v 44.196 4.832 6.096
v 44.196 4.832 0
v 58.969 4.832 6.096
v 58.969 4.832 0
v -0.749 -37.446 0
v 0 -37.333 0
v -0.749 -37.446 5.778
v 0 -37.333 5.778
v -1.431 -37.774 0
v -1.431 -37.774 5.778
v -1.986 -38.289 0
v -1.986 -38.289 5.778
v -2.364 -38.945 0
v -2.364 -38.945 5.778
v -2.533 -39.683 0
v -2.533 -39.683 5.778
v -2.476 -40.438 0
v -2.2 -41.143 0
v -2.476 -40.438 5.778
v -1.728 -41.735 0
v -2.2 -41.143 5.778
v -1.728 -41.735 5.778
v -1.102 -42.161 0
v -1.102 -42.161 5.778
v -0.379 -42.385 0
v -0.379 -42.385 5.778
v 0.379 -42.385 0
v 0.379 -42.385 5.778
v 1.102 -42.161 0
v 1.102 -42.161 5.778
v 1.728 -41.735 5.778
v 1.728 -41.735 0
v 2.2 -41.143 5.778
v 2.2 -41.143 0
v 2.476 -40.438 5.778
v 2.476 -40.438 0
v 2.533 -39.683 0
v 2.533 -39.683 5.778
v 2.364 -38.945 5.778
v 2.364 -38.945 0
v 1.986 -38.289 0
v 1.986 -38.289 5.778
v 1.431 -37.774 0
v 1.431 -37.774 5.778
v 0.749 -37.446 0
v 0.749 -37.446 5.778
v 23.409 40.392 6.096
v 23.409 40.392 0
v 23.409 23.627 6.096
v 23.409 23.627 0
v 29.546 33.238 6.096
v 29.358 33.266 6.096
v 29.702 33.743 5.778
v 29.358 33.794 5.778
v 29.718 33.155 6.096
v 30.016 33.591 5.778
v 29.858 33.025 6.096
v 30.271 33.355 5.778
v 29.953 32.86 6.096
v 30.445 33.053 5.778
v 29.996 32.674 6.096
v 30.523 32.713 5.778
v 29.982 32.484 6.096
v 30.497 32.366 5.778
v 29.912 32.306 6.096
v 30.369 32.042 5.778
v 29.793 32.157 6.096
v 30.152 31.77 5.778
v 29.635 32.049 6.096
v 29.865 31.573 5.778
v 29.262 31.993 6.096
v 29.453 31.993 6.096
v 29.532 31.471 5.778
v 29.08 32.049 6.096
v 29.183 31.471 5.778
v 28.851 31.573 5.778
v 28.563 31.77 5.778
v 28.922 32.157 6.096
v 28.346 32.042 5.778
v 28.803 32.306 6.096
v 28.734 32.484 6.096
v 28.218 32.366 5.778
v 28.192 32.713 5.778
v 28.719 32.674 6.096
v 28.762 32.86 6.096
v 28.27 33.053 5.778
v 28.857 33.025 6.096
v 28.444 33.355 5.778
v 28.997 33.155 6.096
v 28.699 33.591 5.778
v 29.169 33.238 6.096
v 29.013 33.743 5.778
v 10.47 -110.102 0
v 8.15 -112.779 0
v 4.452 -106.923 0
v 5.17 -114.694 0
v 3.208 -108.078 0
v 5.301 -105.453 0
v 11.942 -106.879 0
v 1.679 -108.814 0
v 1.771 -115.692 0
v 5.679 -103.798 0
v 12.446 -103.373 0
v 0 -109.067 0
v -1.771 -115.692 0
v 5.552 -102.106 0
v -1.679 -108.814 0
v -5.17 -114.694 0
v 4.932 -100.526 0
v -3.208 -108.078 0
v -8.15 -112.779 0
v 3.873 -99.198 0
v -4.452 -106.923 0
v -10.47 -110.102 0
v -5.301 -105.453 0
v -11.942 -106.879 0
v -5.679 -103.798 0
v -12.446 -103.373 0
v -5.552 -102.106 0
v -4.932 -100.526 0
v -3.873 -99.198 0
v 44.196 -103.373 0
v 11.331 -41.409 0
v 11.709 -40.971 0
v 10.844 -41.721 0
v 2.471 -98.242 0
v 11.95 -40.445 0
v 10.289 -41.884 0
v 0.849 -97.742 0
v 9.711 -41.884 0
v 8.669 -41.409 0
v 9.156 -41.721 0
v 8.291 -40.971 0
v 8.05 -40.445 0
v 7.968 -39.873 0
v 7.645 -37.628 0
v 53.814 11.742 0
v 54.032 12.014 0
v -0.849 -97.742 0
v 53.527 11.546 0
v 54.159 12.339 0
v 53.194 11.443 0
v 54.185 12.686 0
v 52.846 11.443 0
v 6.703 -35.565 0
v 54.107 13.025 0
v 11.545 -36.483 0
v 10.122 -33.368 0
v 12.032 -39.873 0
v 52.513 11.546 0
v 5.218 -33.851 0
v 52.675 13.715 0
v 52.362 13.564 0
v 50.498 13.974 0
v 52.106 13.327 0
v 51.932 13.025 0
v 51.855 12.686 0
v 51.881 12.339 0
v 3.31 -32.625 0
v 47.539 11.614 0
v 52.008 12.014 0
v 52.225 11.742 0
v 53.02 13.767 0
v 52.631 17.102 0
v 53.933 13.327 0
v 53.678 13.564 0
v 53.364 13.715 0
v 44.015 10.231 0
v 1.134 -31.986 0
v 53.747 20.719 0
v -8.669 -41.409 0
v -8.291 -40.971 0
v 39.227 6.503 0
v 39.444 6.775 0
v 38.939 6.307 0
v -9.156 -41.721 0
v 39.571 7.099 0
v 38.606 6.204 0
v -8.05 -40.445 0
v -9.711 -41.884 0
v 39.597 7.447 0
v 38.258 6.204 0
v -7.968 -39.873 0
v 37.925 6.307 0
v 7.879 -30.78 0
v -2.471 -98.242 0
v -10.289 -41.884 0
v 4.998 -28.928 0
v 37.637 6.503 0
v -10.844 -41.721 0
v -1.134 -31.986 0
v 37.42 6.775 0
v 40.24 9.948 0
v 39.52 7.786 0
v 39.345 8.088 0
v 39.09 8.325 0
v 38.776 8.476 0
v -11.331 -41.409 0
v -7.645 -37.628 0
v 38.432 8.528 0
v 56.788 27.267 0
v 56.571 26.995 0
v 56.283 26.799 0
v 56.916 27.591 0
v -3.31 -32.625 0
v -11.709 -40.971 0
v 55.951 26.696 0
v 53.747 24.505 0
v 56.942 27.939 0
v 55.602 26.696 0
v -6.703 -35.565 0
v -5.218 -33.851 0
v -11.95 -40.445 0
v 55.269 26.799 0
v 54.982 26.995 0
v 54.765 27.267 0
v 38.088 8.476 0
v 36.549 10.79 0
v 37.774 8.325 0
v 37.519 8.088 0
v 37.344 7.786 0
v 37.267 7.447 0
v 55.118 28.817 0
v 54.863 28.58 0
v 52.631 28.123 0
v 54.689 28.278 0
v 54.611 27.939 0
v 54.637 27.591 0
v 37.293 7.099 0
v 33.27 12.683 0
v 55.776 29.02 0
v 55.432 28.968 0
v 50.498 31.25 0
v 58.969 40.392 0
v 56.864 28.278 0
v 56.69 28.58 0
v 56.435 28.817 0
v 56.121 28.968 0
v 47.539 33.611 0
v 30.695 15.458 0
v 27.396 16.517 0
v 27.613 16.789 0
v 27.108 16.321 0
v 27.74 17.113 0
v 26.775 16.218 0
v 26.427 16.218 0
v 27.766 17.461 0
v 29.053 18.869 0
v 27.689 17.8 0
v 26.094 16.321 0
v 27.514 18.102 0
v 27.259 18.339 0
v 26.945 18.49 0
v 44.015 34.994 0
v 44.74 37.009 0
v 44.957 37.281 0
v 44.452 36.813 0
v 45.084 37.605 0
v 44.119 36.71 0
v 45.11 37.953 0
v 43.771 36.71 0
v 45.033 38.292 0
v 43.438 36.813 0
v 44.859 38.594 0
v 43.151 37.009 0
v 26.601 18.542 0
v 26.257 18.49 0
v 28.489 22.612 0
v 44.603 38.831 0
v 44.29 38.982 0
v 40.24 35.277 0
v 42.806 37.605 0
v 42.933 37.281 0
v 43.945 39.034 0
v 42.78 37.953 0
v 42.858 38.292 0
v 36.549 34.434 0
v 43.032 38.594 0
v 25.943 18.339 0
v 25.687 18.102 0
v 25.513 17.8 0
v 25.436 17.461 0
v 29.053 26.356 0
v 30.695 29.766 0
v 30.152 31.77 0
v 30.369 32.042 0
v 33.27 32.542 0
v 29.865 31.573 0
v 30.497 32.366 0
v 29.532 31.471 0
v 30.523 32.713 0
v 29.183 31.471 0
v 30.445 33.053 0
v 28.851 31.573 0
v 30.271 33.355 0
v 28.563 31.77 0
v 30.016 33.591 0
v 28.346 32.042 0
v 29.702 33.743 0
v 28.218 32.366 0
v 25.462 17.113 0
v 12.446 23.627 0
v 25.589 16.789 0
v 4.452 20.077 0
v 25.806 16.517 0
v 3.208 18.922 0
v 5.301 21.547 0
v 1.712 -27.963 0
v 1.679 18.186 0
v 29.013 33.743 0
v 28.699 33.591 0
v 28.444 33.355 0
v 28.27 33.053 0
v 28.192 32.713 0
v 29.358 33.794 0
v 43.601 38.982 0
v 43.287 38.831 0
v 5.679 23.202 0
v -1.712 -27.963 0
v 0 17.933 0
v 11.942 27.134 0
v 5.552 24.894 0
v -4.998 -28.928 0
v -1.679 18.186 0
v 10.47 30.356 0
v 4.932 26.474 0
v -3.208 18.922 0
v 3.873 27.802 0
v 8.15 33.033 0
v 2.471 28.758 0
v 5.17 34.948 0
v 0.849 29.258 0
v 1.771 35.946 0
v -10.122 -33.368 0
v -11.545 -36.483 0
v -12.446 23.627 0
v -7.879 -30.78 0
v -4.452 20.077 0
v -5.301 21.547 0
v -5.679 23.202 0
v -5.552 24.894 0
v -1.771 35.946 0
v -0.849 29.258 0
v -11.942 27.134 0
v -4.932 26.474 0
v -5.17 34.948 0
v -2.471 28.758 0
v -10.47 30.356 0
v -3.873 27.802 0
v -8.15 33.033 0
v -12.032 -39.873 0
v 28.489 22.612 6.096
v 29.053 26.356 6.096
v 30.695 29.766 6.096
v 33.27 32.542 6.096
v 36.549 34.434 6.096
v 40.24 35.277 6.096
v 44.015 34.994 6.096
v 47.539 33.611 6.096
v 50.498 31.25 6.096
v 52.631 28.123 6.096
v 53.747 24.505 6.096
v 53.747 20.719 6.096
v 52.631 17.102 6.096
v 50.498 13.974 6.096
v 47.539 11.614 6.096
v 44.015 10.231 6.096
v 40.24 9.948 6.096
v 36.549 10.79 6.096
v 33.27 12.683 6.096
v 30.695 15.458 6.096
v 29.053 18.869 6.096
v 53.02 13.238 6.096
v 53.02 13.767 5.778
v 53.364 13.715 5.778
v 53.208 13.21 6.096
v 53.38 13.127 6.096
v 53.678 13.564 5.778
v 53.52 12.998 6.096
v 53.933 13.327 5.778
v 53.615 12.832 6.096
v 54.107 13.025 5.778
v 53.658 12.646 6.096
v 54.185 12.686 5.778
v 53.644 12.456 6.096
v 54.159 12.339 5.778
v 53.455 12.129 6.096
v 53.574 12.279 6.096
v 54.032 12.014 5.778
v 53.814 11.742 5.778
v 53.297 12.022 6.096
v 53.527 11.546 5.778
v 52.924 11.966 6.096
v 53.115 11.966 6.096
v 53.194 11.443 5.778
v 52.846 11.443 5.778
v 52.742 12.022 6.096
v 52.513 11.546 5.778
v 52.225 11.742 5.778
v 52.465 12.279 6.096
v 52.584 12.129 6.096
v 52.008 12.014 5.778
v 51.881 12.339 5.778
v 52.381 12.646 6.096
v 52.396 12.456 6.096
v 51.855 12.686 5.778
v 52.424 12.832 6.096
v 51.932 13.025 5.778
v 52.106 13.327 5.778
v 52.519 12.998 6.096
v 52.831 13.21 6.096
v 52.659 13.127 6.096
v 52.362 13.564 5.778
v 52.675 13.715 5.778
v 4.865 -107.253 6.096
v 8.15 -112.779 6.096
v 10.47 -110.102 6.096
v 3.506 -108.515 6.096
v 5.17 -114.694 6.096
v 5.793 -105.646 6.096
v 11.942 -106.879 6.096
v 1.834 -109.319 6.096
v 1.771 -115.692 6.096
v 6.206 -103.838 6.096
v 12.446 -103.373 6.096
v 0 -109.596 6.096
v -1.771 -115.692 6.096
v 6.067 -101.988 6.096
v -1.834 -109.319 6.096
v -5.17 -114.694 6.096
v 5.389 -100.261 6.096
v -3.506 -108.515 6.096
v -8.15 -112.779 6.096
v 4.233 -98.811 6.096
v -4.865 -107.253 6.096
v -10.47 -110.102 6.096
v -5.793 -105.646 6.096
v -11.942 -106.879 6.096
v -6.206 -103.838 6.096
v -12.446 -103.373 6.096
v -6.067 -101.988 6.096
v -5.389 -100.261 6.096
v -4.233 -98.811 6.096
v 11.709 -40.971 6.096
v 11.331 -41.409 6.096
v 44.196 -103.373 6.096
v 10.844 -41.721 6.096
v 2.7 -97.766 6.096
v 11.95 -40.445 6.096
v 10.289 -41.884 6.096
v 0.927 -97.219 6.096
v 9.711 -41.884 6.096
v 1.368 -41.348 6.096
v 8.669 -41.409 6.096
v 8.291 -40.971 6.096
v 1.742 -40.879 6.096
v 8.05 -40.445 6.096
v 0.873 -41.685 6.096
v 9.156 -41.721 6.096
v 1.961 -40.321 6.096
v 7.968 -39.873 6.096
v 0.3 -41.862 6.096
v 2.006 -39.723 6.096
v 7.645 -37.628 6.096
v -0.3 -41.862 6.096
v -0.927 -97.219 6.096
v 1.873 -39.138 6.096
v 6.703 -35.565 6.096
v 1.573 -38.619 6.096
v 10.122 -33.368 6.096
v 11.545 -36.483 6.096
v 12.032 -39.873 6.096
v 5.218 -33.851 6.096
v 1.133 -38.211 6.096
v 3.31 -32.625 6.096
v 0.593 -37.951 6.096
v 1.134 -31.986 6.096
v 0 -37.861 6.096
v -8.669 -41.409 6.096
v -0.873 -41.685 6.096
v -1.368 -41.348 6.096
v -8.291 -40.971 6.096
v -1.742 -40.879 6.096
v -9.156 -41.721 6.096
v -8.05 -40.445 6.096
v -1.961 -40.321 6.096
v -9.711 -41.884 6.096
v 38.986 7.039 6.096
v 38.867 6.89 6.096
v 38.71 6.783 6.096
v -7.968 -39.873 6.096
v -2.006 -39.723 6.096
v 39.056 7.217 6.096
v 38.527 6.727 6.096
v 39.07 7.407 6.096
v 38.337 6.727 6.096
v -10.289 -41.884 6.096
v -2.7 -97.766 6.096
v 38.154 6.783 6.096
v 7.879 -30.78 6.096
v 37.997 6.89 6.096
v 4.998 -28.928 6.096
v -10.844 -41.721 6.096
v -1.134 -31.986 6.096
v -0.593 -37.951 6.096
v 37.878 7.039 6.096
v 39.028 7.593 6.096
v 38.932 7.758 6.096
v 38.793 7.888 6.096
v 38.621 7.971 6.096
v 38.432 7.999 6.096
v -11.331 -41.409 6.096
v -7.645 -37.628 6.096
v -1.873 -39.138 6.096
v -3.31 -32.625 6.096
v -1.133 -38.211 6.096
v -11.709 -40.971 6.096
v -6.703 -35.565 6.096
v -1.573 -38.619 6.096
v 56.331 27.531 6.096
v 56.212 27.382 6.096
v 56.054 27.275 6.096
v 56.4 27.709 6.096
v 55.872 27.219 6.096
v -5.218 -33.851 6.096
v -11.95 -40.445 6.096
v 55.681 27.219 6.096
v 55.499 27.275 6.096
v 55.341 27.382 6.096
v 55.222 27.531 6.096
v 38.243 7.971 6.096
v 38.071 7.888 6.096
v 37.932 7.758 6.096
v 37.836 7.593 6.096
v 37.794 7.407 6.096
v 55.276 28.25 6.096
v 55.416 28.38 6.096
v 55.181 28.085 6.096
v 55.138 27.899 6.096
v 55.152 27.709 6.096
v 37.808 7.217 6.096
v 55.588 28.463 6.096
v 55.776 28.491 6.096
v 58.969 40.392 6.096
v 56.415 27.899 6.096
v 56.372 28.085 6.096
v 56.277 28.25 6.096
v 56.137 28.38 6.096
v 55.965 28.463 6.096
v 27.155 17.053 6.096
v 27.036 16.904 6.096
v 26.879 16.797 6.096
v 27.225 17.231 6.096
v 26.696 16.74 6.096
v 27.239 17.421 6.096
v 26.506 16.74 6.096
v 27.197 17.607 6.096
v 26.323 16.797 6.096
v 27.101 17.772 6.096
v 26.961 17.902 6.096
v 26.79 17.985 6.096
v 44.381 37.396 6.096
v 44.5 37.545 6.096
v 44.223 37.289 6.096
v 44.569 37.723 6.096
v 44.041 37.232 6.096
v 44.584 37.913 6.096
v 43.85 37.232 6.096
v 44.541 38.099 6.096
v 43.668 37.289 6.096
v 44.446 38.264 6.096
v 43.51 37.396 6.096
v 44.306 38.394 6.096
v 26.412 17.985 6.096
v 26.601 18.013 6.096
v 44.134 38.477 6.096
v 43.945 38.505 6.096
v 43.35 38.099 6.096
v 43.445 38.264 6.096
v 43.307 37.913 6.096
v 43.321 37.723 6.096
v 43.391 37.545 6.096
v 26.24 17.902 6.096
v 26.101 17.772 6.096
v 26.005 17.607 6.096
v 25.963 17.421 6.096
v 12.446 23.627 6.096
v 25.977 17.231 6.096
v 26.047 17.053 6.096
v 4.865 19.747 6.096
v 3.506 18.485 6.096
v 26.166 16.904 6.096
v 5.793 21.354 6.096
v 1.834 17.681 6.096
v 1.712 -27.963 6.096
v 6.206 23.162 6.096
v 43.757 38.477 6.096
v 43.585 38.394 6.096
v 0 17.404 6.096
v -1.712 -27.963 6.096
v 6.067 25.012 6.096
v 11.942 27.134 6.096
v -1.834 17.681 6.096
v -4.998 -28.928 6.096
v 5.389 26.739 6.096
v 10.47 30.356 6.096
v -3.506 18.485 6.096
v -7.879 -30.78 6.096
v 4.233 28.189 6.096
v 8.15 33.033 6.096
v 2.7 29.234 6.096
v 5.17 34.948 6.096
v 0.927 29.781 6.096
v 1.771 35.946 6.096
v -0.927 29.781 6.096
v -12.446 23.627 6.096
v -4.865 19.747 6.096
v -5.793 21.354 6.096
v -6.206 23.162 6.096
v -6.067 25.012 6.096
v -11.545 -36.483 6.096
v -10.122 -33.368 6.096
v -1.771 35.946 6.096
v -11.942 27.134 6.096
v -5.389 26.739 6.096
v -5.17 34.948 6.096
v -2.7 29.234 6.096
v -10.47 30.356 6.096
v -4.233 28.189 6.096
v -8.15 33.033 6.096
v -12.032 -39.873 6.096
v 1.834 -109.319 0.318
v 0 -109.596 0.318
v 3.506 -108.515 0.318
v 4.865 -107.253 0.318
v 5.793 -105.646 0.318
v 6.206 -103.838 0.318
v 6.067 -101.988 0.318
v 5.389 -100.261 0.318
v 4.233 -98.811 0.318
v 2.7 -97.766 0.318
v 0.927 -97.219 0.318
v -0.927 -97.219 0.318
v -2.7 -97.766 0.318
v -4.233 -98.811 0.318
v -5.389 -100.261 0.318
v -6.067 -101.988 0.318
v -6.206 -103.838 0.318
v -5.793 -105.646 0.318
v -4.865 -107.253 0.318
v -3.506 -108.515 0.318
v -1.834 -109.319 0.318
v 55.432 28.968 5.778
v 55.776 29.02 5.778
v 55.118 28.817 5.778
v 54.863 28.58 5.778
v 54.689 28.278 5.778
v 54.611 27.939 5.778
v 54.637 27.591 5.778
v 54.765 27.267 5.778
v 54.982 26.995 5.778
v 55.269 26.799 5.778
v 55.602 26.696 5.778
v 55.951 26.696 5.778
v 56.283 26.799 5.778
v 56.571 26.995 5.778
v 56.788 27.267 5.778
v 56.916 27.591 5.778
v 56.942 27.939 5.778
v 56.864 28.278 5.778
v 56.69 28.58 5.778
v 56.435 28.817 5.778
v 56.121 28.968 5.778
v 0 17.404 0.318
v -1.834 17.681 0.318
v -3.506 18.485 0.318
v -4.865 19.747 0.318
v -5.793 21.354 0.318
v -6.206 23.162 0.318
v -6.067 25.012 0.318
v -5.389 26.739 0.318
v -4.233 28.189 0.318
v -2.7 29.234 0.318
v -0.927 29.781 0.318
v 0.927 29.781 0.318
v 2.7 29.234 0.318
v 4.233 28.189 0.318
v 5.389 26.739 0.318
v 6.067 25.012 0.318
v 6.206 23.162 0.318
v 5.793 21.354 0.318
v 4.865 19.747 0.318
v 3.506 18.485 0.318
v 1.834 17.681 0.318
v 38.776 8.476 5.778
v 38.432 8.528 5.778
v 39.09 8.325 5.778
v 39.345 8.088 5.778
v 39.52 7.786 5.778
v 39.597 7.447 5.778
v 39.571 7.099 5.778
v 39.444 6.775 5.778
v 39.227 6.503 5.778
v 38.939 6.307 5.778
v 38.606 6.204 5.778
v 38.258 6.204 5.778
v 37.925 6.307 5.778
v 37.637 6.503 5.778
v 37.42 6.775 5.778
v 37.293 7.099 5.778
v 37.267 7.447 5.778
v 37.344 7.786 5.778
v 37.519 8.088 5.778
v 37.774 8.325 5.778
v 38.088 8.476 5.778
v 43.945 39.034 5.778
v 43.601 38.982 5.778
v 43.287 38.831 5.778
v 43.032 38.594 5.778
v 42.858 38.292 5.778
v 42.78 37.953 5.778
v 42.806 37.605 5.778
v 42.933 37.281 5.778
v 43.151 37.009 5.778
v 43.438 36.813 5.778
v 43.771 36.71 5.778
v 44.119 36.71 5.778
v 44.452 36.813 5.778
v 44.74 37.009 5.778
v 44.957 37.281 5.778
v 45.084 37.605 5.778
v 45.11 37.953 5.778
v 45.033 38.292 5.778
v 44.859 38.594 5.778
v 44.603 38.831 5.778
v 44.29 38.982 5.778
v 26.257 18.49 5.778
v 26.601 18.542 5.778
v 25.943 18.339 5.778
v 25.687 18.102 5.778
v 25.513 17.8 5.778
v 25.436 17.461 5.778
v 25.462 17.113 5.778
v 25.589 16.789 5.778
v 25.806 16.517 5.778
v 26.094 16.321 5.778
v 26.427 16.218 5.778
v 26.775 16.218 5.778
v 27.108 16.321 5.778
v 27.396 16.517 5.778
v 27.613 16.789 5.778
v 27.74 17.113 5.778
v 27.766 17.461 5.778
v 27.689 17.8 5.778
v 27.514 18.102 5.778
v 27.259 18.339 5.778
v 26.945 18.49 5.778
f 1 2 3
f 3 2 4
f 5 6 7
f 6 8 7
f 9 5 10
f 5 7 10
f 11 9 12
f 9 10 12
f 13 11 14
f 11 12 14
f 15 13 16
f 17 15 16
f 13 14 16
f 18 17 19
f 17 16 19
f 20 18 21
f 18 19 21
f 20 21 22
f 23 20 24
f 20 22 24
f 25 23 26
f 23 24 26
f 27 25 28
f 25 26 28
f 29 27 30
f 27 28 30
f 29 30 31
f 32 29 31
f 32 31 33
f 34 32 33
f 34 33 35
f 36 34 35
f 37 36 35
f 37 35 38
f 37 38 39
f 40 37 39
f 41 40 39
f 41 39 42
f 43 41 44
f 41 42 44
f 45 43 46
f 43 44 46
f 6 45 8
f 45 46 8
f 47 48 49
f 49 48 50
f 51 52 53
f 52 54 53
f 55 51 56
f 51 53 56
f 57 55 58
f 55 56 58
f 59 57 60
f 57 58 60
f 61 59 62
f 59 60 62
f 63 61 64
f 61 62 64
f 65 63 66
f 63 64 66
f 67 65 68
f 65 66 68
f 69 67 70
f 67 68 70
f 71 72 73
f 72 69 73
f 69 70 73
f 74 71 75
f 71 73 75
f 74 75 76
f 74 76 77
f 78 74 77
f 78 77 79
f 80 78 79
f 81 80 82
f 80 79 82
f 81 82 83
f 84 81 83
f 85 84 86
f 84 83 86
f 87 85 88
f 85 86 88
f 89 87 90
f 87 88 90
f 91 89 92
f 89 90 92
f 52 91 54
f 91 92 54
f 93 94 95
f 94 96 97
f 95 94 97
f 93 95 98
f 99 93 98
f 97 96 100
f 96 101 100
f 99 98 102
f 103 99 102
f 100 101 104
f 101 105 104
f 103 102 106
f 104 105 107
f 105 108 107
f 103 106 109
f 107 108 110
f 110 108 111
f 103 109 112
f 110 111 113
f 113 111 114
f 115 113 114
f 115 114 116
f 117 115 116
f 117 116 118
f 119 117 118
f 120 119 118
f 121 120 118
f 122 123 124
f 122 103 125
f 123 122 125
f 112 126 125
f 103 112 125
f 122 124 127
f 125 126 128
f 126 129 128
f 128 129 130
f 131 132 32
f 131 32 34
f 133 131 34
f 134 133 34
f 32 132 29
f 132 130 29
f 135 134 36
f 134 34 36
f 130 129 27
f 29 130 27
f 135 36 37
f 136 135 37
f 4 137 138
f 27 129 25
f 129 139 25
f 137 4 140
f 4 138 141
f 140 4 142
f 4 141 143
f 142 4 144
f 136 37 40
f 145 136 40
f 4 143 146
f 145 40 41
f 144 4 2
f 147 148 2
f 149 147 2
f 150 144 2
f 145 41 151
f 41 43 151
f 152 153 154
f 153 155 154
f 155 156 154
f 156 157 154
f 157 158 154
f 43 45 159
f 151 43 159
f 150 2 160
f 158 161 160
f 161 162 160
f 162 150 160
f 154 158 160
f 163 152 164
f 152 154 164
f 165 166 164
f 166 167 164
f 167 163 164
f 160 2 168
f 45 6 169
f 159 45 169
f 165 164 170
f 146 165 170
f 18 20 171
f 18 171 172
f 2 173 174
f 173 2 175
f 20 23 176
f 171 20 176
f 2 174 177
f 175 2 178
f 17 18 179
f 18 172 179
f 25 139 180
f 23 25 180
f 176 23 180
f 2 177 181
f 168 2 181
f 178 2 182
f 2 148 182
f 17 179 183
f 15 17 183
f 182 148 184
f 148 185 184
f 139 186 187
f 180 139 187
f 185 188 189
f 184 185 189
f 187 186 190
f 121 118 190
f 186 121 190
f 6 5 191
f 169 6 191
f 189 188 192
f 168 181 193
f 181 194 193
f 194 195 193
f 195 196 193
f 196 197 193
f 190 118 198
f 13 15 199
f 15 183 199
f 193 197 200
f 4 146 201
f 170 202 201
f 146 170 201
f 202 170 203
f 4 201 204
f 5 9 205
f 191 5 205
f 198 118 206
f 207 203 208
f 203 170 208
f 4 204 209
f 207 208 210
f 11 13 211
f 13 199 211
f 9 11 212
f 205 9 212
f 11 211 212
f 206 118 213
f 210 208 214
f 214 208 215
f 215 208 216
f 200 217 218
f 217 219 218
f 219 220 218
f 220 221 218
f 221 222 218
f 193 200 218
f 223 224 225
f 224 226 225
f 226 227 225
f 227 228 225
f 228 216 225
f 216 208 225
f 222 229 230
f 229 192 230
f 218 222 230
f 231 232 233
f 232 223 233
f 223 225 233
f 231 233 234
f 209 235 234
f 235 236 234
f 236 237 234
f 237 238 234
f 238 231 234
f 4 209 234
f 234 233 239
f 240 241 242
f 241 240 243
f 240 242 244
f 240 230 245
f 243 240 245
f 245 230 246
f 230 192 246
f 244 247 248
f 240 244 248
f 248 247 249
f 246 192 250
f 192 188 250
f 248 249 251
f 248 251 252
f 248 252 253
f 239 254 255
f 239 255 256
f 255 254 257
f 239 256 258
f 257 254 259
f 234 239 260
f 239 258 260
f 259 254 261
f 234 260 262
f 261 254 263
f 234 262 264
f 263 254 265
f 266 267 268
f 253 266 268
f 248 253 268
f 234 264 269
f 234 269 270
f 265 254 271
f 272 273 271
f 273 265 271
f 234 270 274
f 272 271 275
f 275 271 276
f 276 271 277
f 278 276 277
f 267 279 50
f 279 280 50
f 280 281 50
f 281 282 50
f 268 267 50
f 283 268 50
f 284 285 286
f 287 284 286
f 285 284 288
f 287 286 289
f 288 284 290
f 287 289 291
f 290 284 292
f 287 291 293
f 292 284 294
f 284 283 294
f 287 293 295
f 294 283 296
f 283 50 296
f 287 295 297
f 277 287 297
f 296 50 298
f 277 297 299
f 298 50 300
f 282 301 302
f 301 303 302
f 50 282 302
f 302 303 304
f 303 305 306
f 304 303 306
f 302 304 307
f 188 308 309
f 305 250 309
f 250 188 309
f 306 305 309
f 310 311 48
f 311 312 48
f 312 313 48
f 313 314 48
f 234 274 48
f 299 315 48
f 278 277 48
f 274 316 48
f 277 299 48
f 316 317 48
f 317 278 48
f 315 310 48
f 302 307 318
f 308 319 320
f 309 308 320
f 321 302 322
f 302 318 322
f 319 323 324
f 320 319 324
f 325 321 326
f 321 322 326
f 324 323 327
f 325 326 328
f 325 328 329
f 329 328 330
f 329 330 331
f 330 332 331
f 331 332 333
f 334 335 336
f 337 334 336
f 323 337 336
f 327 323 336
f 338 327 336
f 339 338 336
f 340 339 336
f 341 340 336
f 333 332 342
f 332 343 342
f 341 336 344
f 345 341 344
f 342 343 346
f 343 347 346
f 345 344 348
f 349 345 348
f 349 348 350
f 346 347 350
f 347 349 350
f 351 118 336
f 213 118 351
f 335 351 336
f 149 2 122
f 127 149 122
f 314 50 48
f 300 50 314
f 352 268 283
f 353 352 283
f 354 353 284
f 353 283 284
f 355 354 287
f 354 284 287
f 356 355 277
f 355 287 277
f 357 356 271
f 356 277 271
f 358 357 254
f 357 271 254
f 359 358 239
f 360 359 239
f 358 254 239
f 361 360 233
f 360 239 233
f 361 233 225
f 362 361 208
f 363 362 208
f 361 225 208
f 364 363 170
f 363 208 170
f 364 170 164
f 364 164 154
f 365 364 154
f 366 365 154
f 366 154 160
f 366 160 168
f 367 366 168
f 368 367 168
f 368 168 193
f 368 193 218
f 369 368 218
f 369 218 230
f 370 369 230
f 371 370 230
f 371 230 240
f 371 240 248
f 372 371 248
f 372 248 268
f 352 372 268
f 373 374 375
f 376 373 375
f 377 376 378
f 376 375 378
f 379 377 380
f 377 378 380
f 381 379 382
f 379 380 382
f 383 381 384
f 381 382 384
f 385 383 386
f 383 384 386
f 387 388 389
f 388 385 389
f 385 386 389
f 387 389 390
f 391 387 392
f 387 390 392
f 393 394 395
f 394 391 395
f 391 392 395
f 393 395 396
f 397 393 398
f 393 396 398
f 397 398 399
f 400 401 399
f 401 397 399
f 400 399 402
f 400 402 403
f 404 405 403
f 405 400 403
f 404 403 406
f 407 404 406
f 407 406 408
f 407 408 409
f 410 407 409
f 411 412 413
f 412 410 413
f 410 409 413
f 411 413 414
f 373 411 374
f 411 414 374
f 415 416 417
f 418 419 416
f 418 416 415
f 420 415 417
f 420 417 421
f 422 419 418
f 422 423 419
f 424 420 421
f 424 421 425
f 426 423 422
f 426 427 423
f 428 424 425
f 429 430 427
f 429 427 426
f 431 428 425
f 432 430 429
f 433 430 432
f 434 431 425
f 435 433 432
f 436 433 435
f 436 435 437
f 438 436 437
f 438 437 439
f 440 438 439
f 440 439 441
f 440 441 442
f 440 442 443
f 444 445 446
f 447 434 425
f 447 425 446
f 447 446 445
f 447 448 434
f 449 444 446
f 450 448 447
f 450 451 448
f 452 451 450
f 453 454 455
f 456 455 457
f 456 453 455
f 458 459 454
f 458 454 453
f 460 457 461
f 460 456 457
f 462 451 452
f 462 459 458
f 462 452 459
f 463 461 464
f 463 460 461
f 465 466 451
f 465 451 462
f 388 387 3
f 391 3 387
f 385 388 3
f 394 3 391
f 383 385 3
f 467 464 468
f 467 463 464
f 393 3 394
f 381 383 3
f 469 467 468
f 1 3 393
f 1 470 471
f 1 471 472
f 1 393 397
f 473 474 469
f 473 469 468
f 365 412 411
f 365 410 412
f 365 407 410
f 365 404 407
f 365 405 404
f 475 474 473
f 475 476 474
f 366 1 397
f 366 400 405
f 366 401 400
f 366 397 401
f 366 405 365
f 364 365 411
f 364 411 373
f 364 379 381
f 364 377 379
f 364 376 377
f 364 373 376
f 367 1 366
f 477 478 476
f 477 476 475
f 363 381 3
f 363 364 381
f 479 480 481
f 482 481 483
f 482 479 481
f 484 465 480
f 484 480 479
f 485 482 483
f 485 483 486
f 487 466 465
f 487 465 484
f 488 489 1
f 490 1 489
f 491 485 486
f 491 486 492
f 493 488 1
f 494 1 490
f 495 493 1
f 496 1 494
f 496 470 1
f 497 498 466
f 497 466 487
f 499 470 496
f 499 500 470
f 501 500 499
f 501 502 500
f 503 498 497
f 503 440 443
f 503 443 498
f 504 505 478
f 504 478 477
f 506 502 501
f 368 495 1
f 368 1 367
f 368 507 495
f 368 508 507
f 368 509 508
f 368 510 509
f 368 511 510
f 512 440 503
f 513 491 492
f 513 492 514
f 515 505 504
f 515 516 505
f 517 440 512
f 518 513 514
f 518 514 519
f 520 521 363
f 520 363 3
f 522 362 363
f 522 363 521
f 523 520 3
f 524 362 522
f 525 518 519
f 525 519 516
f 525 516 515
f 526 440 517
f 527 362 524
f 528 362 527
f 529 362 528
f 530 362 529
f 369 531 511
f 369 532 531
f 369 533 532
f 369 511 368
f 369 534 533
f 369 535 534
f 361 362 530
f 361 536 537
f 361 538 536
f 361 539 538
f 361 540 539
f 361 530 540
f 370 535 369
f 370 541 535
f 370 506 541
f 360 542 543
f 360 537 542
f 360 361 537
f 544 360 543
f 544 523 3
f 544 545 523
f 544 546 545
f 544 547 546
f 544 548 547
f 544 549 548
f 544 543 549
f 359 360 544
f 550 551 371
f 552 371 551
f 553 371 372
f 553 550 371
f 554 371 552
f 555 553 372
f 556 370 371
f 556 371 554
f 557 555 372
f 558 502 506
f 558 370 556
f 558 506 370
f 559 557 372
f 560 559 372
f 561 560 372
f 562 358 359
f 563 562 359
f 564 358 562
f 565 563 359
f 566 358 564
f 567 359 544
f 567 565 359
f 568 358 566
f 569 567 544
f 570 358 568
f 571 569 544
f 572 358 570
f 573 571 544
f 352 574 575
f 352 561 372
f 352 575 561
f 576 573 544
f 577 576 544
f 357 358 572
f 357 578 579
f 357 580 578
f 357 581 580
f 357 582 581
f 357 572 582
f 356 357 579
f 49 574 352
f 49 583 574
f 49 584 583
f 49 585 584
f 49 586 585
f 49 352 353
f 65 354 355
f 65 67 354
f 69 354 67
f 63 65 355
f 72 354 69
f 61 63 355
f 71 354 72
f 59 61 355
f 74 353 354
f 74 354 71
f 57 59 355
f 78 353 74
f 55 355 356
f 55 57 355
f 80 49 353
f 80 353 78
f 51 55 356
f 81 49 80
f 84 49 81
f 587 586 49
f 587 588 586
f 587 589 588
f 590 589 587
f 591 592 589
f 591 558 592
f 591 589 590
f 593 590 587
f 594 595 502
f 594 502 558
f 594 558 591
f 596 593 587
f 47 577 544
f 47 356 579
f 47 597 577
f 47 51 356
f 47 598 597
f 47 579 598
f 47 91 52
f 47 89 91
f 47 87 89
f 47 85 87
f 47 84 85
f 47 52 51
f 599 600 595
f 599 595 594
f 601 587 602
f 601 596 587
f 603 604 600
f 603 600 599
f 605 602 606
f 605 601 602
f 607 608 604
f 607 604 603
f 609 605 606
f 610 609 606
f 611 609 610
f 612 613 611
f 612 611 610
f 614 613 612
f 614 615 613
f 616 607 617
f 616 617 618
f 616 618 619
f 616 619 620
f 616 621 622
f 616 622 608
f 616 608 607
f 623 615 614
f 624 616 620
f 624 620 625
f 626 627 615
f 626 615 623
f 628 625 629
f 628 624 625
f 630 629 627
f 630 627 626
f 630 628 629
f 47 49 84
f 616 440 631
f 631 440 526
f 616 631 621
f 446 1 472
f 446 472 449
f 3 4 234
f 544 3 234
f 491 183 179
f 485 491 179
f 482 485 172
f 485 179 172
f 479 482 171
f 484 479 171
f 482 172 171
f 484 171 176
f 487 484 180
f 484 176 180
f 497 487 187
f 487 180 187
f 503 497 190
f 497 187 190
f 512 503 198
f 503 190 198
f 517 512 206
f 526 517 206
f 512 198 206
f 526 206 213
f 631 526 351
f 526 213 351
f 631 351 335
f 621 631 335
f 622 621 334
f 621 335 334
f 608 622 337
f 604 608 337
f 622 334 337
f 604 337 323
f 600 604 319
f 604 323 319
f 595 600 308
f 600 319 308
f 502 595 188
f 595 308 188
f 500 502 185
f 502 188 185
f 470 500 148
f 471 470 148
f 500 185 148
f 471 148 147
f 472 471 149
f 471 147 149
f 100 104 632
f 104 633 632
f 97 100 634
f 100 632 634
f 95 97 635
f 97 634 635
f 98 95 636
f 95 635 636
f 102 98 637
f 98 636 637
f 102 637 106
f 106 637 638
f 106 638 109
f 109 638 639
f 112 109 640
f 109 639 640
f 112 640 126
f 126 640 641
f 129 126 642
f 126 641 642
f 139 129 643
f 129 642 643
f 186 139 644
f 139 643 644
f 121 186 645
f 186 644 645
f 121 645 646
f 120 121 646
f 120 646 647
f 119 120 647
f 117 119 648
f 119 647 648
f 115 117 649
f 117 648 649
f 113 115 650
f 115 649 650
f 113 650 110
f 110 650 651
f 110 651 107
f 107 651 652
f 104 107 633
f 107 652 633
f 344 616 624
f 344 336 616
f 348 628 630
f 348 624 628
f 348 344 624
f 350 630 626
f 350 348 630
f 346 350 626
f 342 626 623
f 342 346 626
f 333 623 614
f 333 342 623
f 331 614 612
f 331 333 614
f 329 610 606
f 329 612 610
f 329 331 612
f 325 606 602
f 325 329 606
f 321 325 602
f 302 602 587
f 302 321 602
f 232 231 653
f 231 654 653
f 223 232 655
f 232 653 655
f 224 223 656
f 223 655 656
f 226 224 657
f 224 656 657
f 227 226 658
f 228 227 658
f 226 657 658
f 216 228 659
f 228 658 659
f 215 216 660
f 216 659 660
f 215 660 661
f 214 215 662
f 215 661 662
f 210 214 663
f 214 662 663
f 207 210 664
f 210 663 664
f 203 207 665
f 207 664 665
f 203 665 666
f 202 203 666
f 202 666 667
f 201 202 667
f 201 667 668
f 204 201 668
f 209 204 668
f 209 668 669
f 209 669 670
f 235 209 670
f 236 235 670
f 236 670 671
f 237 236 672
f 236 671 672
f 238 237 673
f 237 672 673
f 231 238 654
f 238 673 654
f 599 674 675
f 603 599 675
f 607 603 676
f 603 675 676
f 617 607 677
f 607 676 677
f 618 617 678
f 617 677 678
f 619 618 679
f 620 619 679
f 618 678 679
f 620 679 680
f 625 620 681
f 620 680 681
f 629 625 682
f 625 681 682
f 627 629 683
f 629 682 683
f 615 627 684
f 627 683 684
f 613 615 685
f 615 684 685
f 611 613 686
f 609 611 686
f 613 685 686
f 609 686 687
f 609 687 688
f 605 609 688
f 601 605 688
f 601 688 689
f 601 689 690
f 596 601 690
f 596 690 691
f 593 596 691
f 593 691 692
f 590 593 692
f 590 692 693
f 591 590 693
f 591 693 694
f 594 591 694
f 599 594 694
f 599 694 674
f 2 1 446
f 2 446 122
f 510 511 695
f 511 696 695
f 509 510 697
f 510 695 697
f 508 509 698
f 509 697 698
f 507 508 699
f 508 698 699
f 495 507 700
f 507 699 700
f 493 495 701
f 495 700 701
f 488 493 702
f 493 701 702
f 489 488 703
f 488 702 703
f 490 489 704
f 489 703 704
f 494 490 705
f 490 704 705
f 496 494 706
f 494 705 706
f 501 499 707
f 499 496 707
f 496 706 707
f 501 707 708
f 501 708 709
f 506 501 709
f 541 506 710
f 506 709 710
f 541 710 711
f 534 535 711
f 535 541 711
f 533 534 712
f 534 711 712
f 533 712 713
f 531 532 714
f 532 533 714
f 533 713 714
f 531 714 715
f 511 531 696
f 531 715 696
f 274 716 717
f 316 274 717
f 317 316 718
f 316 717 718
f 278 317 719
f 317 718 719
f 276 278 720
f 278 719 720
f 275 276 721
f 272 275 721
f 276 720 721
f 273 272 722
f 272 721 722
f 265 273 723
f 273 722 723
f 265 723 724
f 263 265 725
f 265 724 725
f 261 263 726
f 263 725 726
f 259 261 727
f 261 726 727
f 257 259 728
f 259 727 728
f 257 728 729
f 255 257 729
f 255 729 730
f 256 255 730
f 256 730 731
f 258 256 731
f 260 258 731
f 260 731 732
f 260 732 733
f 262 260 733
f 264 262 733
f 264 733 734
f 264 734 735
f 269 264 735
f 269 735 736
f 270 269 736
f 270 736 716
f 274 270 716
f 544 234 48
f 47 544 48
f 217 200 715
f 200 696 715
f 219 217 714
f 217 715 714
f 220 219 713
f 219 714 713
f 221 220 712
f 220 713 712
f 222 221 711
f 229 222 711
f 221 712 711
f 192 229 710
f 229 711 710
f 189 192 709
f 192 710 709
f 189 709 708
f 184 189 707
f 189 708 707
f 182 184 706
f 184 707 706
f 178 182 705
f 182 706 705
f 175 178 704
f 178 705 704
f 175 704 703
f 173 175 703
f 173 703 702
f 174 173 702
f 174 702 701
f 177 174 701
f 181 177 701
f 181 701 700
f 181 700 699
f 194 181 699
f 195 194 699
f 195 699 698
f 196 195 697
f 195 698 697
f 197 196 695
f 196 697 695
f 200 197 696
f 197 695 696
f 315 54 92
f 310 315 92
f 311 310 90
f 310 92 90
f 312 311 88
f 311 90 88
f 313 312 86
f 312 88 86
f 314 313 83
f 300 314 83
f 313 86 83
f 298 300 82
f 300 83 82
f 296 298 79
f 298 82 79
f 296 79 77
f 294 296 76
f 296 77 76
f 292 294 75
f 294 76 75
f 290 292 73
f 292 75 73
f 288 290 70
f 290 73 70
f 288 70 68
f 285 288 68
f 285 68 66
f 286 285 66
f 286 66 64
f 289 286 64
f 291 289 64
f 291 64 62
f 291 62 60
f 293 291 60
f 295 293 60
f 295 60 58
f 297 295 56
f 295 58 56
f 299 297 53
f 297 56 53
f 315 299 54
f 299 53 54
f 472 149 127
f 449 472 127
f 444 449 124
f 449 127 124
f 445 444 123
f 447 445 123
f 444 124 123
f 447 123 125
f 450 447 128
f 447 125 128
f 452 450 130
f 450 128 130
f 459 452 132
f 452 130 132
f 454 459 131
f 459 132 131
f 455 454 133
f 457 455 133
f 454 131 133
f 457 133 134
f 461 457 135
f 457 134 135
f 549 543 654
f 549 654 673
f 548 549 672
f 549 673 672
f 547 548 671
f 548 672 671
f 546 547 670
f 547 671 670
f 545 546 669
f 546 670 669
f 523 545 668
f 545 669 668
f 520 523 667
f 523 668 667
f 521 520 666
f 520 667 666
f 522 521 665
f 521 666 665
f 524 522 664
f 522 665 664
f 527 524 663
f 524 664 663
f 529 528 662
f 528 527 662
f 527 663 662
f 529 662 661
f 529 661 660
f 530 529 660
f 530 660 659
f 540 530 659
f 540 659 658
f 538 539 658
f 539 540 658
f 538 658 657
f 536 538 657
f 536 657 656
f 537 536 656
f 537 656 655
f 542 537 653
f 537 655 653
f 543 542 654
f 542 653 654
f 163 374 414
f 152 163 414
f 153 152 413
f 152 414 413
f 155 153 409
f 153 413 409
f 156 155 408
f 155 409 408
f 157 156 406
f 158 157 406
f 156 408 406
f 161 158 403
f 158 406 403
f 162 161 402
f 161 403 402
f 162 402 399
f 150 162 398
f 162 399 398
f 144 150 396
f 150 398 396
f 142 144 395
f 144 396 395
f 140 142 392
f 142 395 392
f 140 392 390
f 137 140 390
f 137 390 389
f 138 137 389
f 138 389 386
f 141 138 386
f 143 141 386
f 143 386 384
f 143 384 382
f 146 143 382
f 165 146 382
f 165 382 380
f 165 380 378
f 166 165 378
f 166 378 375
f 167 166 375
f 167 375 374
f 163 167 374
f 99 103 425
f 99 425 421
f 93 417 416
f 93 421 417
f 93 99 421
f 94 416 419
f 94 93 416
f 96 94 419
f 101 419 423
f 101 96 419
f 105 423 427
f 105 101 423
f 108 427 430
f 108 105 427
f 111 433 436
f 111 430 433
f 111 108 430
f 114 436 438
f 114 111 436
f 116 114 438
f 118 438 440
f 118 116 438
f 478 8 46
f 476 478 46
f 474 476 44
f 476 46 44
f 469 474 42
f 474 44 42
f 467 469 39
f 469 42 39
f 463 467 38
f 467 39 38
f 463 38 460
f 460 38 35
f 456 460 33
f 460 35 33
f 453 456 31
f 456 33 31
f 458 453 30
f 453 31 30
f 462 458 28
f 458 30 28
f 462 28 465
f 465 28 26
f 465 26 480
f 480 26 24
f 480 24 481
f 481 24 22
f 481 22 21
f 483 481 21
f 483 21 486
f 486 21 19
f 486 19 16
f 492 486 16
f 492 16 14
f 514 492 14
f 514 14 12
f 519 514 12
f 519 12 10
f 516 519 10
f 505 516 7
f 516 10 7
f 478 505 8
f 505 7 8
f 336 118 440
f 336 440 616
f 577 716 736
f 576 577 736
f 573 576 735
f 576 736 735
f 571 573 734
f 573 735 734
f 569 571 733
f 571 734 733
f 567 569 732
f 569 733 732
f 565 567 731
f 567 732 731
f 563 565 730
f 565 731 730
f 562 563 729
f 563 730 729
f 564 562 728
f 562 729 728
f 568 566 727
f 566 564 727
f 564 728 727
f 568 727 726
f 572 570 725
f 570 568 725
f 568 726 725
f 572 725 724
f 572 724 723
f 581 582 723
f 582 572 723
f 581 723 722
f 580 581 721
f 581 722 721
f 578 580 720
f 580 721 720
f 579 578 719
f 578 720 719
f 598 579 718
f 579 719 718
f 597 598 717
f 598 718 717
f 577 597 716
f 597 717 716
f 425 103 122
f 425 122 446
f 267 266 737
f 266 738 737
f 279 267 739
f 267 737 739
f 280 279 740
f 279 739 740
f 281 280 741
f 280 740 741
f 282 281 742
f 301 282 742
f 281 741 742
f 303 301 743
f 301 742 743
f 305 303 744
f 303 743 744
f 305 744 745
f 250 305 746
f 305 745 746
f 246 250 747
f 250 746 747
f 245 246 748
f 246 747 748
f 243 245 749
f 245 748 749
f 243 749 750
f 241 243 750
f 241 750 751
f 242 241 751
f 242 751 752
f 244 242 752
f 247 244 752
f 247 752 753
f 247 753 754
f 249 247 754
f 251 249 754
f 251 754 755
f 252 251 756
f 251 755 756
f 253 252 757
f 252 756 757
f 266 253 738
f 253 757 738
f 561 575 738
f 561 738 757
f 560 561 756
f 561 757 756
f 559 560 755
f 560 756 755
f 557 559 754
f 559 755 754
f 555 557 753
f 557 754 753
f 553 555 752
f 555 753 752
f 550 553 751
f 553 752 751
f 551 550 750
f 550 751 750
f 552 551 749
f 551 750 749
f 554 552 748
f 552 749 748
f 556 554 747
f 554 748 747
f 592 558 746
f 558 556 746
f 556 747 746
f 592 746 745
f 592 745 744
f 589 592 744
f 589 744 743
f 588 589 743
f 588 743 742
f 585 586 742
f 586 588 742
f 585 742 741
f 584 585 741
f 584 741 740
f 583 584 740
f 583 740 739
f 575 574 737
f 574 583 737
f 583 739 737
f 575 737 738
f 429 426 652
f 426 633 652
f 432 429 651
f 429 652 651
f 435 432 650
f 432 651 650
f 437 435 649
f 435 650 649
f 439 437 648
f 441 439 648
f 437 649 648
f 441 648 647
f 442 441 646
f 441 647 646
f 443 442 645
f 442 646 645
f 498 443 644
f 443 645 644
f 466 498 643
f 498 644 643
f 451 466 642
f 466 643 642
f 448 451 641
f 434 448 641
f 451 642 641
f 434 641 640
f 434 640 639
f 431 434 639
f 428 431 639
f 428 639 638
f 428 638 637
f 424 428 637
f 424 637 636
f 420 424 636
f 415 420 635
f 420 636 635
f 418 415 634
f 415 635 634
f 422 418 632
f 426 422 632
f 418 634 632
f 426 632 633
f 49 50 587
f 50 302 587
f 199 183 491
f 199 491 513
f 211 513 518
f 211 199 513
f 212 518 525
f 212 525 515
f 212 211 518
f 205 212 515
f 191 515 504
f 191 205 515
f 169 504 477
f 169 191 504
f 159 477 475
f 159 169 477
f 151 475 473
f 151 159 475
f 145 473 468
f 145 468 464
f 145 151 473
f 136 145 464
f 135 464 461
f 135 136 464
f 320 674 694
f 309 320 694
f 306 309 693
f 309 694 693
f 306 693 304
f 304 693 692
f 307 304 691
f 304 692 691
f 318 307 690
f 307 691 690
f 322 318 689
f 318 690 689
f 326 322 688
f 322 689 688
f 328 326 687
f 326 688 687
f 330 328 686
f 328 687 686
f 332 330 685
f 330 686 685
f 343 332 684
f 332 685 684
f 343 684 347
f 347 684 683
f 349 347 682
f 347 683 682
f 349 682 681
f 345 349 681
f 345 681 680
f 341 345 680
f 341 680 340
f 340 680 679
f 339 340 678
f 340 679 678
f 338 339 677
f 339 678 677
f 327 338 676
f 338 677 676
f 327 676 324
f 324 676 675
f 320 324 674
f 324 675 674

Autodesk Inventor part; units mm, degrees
ref_plane "YZ Plane" through (0, 0, 0) normal (1, 0, 0) x (0, 1, 0)
ref_plane "XZ Plane" through (0, 0, 0) normal (0, 1, 0) x (-1, 0, 0)
ref_plane "XY Plane" through (0, 0, 0) normal (0, 0, 1) x (1, 0, 0)
sketch "Sketch1" plane through (0, 0, 0) normal (0, 0, 1) x (1, 0, 0)
  line L0 (0, -103.3729) -> (0, 23.6271) construction
  line L1 (-12.446, -103.3729) -> (-12.446, 23.6271)
  line L2 (12.446, 23.6271) -> (12.446, -103.3729)
  arc A0 (-12.446, -103.3729) -> (12.446, -103.3729) centre (0, -103.3729) ccw
  arc A1 (12.446, 23.6271) -> (-12.446, 23.6271) centre (0, 23.6271) ccw
  point P0 (0, 0)
  point P1 (0, -39.8729)
  dimension "d0" = 63.5
  dimension "d1" = 24.892
extrude "Extrusion1" add sketch "Sketch1" along normal blind 6.096
sketch "Sketch2" plane through (0, 0, 6.096) normal (0, 0, 1) x (1, 0, 0)
  line L0 (-12.446, 23.6271) -> (-12.446, -103.3729) projected
  arc A0 (-12.446, -103.3729) -> (12.446, -103.3729) centre (0, -103.3729) ccw projected
  line L1 (12.446, -103.3729) -> (12.446, 23.6271) projected
  arc A1 (12.446, 23.6271) -> (-12.446, 23.6271) centre (0, 23.6271) ccw projected
  point P0 (0, 0)
  point P1 (0, -39.8729)
hole "Hole1" at (0, 23.6271, 6.096) at (0, -103.3729, 6.096) direction (0, 0, -1) diameter 12.446 depth 5.7785 tip angle 118
hole "Hole2" at (0, -39.8729, 0) direction (0, 0, 1) diameter 5.08 depth 5.7785 tip angle 118
sketch "Sketch3" plane through (0, 0, 0) normal (0, 0, -1) x (-1, 0, 0)
  circle A0 centre (0, -39.8729) radius 2.0116 projected
  arc A1 (10, -39.8729) -> (-10, -39.8729) centre (0, -39.8729) ccw construction
  arc A2 (12.032, -39.8729) -> (-12.032, -39.8729) centre (0, -39.8729) ccw
  arc A3 (7.968, -39.8729) -> (-7.968, -39.8729) centre (0, -39.8729) ccw
  arc A4 (7.968, -39.8729) -> (12.032, -39.8729) centre (10, -39.8729) ccw
  arc A5 (-12.032, -39.8729) -> (-7.968, -39.8729) centre (-10, -39.8729) ccw
  point P0 (0, 0)
  dimension "d18" = 2.032
  dimension "d19" = 10
extrude "Extrusion2" cut sketch "Sketch3" against normal through all contours A4 A3 A5 A2
sketch "Sketch4" plane through (12.446, -103.3729, 0) normal (1, 0, 0) x (0, 0, -1)
  line L0 (0, 0) -> (0, 127) projected
  line L1 (0, 127) -> (-6.096, 127) projected
  line L2 (-6.096, 0) -> (-6.096, 127) projected
  line L3 (0, 0) -> (-6.096, 0) projected
  point P0 (0, 103.3729)
extrude "Extrusion3" add sketch "Sketch4" along normal blind 31.75
sketch "Sketch5" plane through (0, 0, 0) normal (0, 0, -1) x (-1, 0, 0)
  line L0 (-23.4086, 4.8323) -> (-58.9686, 4.8323)
  line L1 (-58.9686, 4.8323) -> (-58.9686, 40.3923)
  line L2 (-58.9686, 40.3923) -> (-23.4086, 40.3923)
  line L3 (-23.4086, 40.3923) -> (-23.4086, 4.8323)
  circle A0 centre (-41.1886, 22.6123) radius 12.7
  line L4 (8.5245, 22.6123) -> (-42.691, 22.6123)
  line L5 (-12.446, 23.6271) -> (-44.196, 23.6271) projected
  circle A1 centre (0, 23.6271) radius 5.6946 projected
  point P0 (0, 0)
  point P1 (-29.3576, 32.6261)
  point P2 (-43.9453, 37.8652)
  point P3 (-55.7764, 27.8514)
  point P4 (-53.0197, 12.5985)
  point P5 (-38.432, 7.3594)
  point P6 (-26.6009, 17.3732)
  point P7 (-47.5832, 13.0873)
  point P8 (-42.5032, 13.0873)
  point P9 (-28.4886, 22.6123)
  point P10 (-23.4086, 22.6123)
  dimension "d24" = 35.56
  dimension "d25" = 35.56
  dimension "d26" = 25.4
  dimension "d27" = 17.78
  dimension "d28" = 17.78
  dimension "d29" = 15.5
  dimension "d32" = 360
  dimension "d45" = 41.1886
extrude "Extrusion4" add sketch "Sketch5" against normal up to surface (6.096 mm away) contours L0 L1 L2 L3 L5 A0 L4 | L4 A0 L5 L3 | A0
extrude "Extrusion5" cut sketch "Sketch5" against normal through all contours A0
hole "Hole3" at (26.6009, 17.3732, 0) at (38.432, 7.3594, 0) at (53.0197, 12.5985, 0) at (55.7764, 27.8514, 0) at (43.9453, 37.8652, 0) at (29.3576, 32.6261, 0) direction (0, 0, 1) diameter 2.3368 depth 5.7785 tip angle 118
equation "\"d27\" = 0.5 * d25"
equation "\"d28\" = 0.5 * d24"
properties part number "new conveyor bar"
